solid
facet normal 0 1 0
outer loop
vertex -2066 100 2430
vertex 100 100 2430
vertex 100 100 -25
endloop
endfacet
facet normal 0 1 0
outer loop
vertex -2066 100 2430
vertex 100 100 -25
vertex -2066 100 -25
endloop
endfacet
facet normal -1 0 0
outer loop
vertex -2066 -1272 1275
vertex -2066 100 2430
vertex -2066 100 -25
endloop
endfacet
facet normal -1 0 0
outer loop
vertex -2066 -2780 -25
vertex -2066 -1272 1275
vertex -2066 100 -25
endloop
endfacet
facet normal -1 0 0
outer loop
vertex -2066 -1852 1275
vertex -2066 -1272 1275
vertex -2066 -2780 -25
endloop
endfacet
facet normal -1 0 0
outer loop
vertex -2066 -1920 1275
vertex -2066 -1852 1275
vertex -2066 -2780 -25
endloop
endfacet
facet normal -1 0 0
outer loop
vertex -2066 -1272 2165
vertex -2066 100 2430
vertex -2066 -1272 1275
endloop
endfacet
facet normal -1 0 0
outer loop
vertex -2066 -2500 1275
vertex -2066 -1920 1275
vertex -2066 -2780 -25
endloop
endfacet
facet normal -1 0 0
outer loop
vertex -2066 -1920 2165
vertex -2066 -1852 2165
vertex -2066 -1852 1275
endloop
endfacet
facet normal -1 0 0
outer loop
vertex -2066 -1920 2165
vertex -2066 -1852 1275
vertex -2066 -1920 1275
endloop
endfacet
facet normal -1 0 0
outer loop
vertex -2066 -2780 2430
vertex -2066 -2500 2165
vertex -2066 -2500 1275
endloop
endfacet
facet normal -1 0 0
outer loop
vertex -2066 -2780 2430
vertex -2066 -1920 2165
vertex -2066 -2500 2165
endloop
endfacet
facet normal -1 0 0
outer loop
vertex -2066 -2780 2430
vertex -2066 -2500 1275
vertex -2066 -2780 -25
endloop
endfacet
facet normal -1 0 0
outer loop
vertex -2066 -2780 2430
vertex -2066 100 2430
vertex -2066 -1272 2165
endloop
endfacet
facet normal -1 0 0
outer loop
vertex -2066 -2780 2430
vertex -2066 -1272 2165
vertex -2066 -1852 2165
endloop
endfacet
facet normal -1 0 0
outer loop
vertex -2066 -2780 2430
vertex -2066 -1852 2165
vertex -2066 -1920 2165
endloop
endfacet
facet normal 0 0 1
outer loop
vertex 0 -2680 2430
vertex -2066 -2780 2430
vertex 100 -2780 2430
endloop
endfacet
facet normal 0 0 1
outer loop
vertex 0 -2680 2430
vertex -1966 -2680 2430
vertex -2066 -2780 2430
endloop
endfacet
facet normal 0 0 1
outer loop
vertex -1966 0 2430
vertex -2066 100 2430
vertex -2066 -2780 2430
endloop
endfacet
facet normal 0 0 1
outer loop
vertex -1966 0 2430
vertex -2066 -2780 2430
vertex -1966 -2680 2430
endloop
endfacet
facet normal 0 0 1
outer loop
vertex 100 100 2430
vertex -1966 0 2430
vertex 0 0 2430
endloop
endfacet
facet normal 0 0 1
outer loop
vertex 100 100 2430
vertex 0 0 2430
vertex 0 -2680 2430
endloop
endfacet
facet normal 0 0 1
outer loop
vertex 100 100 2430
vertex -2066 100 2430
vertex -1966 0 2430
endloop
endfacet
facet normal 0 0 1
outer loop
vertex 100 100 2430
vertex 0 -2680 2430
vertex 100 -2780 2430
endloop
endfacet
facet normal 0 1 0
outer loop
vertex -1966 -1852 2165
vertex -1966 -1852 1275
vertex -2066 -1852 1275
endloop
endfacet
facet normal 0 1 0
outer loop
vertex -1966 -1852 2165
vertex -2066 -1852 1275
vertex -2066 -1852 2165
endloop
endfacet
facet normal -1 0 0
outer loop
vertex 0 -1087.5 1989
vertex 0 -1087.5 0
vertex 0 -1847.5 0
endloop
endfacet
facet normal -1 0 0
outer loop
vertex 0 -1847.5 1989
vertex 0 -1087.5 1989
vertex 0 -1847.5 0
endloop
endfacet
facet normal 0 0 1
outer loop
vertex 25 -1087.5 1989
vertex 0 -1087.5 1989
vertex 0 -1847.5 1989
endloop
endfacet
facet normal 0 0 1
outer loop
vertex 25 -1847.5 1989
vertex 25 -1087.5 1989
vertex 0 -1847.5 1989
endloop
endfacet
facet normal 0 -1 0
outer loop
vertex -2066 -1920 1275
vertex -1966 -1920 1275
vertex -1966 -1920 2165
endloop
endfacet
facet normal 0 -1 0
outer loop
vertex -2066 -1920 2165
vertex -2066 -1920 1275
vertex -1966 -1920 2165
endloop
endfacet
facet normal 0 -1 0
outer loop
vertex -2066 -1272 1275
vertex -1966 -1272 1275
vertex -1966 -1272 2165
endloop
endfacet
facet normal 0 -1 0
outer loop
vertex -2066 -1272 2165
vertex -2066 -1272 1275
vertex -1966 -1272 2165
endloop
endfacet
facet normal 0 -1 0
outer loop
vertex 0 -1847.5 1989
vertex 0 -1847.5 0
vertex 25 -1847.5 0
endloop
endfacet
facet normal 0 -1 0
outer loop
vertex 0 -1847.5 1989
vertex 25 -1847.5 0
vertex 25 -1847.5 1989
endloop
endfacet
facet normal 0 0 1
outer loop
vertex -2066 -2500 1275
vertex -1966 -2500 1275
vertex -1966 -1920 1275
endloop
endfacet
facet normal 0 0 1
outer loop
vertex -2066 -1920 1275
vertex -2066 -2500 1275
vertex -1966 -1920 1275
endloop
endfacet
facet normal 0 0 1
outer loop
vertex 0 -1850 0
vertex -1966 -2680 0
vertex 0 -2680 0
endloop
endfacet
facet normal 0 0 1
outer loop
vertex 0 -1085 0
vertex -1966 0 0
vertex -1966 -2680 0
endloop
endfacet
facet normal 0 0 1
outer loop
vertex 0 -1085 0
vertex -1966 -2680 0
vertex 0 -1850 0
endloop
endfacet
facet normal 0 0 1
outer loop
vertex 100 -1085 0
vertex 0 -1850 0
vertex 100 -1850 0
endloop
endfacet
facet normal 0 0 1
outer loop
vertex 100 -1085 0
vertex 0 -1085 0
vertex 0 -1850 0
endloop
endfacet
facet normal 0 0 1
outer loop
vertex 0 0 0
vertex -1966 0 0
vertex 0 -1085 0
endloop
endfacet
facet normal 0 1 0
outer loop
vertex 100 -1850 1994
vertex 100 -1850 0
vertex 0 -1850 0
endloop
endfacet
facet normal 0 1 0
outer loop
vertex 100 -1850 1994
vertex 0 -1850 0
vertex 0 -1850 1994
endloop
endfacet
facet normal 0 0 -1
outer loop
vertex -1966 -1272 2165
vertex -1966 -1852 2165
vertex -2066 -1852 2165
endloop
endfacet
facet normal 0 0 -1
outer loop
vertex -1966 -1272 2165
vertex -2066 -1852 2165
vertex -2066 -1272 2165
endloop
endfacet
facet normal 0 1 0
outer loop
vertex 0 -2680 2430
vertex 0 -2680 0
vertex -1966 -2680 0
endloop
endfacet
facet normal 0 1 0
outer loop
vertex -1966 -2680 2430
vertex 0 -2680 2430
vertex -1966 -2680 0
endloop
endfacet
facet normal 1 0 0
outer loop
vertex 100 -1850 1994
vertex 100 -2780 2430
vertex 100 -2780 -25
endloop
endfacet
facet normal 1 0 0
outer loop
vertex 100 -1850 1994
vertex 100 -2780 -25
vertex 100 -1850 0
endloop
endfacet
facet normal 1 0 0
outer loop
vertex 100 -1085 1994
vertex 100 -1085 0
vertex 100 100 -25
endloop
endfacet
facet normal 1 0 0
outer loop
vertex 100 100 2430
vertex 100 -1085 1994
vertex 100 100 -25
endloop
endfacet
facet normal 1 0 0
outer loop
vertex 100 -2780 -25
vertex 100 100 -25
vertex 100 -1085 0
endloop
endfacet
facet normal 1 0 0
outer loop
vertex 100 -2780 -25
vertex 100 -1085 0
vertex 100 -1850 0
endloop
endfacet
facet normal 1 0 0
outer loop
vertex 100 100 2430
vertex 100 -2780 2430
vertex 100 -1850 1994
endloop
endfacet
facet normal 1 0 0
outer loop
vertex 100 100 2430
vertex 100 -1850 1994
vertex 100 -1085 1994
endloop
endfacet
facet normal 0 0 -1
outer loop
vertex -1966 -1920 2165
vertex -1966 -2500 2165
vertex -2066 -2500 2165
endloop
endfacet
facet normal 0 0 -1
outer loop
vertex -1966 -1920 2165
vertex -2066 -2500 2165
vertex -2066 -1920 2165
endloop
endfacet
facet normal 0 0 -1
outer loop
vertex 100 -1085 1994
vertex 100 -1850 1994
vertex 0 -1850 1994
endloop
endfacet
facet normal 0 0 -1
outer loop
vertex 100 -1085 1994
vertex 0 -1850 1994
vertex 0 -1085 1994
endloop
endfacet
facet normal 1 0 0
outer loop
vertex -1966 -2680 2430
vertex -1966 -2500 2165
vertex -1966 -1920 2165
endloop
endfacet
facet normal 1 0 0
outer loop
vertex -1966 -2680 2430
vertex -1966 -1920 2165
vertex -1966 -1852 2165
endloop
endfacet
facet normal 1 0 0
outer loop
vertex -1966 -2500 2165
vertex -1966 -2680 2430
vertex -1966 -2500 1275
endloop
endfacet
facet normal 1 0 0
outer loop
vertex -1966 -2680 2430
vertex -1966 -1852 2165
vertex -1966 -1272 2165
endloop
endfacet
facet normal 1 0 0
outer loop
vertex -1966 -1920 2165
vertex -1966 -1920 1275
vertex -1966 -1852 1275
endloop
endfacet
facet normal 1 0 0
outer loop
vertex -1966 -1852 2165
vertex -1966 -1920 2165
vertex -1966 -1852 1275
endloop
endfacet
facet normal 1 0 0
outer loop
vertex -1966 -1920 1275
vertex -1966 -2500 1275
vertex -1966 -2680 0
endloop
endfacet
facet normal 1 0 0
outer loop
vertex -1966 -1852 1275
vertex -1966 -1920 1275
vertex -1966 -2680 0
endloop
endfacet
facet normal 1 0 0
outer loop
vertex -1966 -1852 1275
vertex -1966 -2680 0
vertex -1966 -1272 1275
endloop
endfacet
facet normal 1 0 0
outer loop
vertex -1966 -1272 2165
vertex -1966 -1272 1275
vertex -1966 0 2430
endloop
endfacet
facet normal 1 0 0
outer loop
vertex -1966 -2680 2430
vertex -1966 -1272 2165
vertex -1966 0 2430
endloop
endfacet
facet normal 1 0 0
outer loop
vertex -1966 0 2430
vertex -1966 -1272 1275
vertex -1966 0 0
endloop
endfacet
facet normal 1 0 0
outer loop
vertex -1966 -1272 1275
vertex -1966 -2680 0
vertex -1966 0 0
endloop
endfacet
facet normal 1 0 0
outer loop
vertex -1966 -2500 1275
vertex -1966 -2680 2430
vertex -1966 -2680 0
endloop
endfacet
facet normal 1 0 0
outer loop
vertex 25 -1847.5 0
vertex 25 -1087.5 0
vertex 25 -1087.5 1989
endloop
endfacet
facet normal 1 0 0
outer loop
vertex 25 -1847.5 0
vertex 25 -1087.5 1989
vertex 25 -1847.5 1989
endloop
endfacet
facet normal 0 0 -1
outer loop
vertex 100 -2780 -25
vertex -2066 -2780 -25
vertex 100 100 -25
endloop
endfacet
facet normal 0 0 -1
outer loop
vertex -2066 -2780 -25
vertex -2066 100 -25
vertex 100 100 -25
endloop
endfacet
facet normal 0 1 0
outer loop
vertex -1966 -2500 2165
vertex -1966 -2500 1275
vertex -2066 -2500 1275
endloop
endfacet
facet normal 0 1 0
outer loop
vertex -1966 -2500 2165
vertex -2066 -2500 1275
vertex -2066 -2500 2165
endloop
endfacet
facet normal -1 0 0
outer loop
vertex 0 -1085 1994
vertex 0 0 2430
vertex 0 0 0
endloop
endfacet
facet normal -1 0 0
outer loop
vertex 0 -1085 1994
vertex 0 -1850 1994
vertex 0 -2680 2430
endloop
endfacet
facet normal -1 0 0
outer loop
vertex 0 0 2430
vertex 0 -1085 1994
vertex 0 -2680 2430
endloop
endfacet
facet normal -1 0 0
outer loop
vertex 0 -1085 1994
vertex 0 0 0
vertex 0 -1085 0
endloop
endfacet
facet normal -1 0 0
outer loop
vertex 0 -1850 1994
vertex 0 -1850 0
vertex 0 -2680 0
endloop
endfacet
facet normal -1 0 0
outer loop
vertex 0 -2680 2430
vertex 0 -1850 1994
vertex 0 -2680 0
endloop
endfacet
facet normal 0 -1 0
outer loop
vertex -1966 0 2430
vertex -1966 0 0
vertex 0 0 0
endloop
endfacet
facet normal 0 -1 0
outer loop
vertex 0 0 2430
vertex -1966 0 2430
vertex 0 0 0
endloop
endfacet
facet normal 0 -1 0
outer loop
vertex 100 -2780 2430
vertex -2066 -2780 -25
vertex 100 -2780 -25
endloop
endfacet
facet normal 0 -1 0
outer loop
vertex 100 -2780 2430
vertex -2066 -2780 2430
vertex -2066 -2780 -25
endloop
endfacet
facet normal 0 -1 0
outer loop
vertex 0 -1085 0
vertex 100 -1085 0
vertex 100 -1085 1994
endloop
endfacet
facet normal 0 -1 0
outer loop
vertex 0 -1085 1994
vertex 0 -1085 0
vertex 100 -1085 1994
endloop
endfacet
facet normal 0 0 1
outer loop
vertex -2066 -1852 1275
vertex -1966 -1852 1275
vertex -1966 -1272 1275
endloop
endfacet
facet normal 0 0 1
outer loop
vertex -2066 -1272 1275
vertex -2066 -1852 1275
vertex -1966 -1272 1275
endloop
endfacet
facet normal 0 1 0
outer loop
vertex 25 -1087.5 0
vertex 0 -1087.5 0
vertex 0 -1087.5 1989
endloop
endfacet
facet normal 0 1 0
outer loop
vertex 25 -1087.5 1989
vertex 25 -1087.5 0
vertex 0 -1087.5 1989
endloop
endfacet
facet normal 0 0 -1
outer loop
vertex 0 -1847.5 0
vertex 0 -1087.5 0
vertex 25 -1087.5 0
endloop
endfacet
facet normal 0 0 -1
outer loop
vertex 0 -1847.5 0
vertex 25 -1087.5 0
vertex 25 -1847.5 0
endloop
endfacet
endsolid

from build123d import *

# Parameters (mm, degrees)
F0_W     = 100
F0_H     = 580
F0_H_2   = 68
F0_H_3   = 765
F1_DEPTH = 2430
F2_W     = 580
F2_H     = 890
F3_DEPTH = 100.001
F4_W     = 765
F4_H     = 1994
F5_DEPTH = 100
F6_W     = 760
F6_H     = 1989
F7_DEPTH = 25
F8_DEPTH = 25


with BuildPart() as f1:
    # F0 (on Top) → F1 (new body)
    with BuildSketch(Plane.XY):
        Polygon((0, -2680), (-1966, -2680), (-1966, -2500), (-2066, -2500), (-2066, -2780), (100, -2780), (100, -1850), (0, -1850), align=None)
        with Locations((-2016, -2210)):
            Rectangle(F0_W, F0_H)
        with Locations((-2016, -1886)):
            Rectangle(F0_W, F0_H_2)
        with Locations((-2016, -1562)):
            Rectangle(F0_W, F0_H)
        with Locations((50, -1467.5)):
            Rectangle(F0_W, F0_H_3)
        Polygon((0, 0), (0, -1085), (100, -1085), (100, 100), (-2066, 100), (-2066, -1272), (-1966, -1272), (-1966, 0), align=None)
    extrude(amount=F1_DEPTH)

    # F2 (on face) → F3 (cut, through all)
    with BuildSketch(Plane.YZ.offset(-1966)):
        with Locations((-1562, 1720)):
            Rectangle(F2_W, F2_H)
        with Locations((-2210, 1720)):
            Rectangle(F2_W, F2_H)
    extrude(amount=-F3_DEPTH, mode=Mode.SUBTRACT)

    # F4 (on face) → F5 (cut, through all)
    with BuildSketch(Plane.YZ.offset(100)):
        with Locations((-1467.5, 997)):
            Rectangle(F4_W, F4_H)
    extrude(amount=-F5_DEPTH, mode=Mode.SUBTRACT)

    # F0 (on Top) → F8 (join)
    with BuildSketch(Plane.XY):
        Polygon((0, -2680), (-1966, -2680), (-1966, -2500), (-2066, -2500), (-2066, -2780), (100, -2780), (100, -1850), (0, -1850), align=None)
        with Locations((-2016, -2210)):
            Rectangle(F0_W, F0_H)
        with Locations((50, -1467.5)):
            Rectangle(F0_W, F0_H_3)
        with Locations((-2016, -1886)):
            Rectangle(F0_W, F0_H_2)
        Polygon((0, 0), (0, -1085), (100, -1085), (100, 100), (-2066, 100), (-2066, -1272), (-1966, -1272), (-1966, 0), align=None)
        with Locations((-2016, -1562)):
            Rectangle(F0_W, F0_H)
        Polygon((-1966, -2500), (-1966, -2680), (0, -2680), (0, -1850), (0, -1085), (0, 0), (-1966, 0), (-1966, -1272), (-1966, -1852), (-1966, -1920), align=None)
    extrude(amount=-F8_DEPTH)


with BuildPart() as f7:
    # F6 (on face) → F7 (new body)
    with BuildSketch(Plane(origin=(0, 0, 0), x_dir=(0, -1, 0), z_dir=(-1, 0, 0))):
        with Locations((1467.5, 994.5)):
            Rectangle(F6_W, F6_H)
    extrude(amount=-F7_DEPTH)


solid = Compound([f1.part, f7.part])
